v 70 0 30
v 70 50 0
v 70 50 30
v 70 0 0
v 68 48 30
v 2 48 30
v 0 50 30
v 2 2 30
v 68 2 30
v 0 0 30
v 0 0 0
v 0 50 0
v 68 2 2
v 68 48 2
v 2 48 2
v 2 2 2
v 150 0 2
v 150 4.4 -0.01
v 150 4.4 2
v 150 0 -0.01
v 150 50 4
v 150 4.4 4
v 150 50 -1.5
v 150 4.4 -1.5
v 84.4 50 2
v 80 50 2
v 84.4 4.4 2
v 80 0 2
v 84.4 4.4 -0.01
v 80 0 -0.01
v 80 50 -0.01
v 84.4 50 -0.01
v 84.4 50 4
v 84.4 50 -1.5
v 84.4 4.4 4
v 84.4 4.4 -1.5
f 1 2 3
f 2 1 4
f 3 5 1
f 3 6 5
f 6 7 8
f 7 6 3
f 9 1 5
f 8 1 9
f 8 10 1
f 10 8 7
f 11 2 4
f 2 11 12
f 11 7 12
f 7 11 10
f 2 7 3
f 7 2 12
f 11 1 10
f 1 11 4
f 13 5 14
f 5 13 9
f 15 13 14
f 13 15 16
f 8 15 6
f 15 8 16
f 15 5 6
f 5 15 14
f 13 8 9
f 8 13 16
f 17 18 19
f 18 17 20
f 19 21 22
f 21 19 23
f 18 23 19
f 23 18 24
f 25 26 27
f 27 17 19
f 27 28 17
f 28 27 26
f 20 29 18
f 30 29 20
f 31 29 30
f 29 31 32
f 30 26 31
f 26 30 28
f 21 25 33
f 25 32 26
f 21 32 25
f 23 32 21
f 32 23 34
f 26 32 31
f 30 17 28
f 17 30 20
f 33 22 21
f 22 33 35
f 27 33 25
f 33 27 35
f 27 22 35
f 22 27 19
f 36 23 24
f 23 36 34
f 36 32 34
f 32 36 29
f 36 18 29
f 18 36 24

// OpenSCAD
// Two-part enclosure for small electronics board
// Print orientation: box standing on bed, lid flat on bed to the right

$fn = 64;

// ---- Box ----
box_x = 70;      // outer length (X)
box_y = 50;      // outer width (Y)
box_z = 30;      // outer height (Z)
wall  = 2;       // wall thickness
floor = 2;       // floor thickness

// ---- Lid ----
lip_x      = 65.6;   // outer length of lip
lip_y      = 45.6;   // outer width of lip
lip_h      = 4;      // lip height
lip_t      = 1.5;    // lip wall thickness
clearance = 0.2;    // gap between lip inner edge and box opening
overlap    = 0.01;   // small overlap to fuse lid to plate

// Derived
opening_x = box_x - 2*wall;
opening_y = box_y - 2*wall;
plate_t   = 2;

module box() {
    difference() {
        cube([box_x, box_y, box_z]);
        translate([wall, wall, floor])
            cube([opening_x, opening_y, box_z - floor + 0.01]);
    }
}

module lid() {
    union() {
        // Base plate
        translate([0, 0, -overlap])
            cube([box_x, box_y, plate_t + overlap]);
        // Lip
        translate([box_x - lip_x, box_y - lip_y, 0])
            cube([lip_x, lip_y, lip_h]);
        // Lip wall
        translate([box_x - lip_x, box_y - lip_y, -lip_t])
            cube([lip_x, lip_y, lip_t + overlap]);
    }
}

difference() {
    union() {
        box();
        translate([box_x + 10, 0, 0])
            lid();
    }
    // Fuse the two parts
    translate([box_x + 5, box_y / 2, box_z / 2])
        cube([10, box_y, box_z]);
}
